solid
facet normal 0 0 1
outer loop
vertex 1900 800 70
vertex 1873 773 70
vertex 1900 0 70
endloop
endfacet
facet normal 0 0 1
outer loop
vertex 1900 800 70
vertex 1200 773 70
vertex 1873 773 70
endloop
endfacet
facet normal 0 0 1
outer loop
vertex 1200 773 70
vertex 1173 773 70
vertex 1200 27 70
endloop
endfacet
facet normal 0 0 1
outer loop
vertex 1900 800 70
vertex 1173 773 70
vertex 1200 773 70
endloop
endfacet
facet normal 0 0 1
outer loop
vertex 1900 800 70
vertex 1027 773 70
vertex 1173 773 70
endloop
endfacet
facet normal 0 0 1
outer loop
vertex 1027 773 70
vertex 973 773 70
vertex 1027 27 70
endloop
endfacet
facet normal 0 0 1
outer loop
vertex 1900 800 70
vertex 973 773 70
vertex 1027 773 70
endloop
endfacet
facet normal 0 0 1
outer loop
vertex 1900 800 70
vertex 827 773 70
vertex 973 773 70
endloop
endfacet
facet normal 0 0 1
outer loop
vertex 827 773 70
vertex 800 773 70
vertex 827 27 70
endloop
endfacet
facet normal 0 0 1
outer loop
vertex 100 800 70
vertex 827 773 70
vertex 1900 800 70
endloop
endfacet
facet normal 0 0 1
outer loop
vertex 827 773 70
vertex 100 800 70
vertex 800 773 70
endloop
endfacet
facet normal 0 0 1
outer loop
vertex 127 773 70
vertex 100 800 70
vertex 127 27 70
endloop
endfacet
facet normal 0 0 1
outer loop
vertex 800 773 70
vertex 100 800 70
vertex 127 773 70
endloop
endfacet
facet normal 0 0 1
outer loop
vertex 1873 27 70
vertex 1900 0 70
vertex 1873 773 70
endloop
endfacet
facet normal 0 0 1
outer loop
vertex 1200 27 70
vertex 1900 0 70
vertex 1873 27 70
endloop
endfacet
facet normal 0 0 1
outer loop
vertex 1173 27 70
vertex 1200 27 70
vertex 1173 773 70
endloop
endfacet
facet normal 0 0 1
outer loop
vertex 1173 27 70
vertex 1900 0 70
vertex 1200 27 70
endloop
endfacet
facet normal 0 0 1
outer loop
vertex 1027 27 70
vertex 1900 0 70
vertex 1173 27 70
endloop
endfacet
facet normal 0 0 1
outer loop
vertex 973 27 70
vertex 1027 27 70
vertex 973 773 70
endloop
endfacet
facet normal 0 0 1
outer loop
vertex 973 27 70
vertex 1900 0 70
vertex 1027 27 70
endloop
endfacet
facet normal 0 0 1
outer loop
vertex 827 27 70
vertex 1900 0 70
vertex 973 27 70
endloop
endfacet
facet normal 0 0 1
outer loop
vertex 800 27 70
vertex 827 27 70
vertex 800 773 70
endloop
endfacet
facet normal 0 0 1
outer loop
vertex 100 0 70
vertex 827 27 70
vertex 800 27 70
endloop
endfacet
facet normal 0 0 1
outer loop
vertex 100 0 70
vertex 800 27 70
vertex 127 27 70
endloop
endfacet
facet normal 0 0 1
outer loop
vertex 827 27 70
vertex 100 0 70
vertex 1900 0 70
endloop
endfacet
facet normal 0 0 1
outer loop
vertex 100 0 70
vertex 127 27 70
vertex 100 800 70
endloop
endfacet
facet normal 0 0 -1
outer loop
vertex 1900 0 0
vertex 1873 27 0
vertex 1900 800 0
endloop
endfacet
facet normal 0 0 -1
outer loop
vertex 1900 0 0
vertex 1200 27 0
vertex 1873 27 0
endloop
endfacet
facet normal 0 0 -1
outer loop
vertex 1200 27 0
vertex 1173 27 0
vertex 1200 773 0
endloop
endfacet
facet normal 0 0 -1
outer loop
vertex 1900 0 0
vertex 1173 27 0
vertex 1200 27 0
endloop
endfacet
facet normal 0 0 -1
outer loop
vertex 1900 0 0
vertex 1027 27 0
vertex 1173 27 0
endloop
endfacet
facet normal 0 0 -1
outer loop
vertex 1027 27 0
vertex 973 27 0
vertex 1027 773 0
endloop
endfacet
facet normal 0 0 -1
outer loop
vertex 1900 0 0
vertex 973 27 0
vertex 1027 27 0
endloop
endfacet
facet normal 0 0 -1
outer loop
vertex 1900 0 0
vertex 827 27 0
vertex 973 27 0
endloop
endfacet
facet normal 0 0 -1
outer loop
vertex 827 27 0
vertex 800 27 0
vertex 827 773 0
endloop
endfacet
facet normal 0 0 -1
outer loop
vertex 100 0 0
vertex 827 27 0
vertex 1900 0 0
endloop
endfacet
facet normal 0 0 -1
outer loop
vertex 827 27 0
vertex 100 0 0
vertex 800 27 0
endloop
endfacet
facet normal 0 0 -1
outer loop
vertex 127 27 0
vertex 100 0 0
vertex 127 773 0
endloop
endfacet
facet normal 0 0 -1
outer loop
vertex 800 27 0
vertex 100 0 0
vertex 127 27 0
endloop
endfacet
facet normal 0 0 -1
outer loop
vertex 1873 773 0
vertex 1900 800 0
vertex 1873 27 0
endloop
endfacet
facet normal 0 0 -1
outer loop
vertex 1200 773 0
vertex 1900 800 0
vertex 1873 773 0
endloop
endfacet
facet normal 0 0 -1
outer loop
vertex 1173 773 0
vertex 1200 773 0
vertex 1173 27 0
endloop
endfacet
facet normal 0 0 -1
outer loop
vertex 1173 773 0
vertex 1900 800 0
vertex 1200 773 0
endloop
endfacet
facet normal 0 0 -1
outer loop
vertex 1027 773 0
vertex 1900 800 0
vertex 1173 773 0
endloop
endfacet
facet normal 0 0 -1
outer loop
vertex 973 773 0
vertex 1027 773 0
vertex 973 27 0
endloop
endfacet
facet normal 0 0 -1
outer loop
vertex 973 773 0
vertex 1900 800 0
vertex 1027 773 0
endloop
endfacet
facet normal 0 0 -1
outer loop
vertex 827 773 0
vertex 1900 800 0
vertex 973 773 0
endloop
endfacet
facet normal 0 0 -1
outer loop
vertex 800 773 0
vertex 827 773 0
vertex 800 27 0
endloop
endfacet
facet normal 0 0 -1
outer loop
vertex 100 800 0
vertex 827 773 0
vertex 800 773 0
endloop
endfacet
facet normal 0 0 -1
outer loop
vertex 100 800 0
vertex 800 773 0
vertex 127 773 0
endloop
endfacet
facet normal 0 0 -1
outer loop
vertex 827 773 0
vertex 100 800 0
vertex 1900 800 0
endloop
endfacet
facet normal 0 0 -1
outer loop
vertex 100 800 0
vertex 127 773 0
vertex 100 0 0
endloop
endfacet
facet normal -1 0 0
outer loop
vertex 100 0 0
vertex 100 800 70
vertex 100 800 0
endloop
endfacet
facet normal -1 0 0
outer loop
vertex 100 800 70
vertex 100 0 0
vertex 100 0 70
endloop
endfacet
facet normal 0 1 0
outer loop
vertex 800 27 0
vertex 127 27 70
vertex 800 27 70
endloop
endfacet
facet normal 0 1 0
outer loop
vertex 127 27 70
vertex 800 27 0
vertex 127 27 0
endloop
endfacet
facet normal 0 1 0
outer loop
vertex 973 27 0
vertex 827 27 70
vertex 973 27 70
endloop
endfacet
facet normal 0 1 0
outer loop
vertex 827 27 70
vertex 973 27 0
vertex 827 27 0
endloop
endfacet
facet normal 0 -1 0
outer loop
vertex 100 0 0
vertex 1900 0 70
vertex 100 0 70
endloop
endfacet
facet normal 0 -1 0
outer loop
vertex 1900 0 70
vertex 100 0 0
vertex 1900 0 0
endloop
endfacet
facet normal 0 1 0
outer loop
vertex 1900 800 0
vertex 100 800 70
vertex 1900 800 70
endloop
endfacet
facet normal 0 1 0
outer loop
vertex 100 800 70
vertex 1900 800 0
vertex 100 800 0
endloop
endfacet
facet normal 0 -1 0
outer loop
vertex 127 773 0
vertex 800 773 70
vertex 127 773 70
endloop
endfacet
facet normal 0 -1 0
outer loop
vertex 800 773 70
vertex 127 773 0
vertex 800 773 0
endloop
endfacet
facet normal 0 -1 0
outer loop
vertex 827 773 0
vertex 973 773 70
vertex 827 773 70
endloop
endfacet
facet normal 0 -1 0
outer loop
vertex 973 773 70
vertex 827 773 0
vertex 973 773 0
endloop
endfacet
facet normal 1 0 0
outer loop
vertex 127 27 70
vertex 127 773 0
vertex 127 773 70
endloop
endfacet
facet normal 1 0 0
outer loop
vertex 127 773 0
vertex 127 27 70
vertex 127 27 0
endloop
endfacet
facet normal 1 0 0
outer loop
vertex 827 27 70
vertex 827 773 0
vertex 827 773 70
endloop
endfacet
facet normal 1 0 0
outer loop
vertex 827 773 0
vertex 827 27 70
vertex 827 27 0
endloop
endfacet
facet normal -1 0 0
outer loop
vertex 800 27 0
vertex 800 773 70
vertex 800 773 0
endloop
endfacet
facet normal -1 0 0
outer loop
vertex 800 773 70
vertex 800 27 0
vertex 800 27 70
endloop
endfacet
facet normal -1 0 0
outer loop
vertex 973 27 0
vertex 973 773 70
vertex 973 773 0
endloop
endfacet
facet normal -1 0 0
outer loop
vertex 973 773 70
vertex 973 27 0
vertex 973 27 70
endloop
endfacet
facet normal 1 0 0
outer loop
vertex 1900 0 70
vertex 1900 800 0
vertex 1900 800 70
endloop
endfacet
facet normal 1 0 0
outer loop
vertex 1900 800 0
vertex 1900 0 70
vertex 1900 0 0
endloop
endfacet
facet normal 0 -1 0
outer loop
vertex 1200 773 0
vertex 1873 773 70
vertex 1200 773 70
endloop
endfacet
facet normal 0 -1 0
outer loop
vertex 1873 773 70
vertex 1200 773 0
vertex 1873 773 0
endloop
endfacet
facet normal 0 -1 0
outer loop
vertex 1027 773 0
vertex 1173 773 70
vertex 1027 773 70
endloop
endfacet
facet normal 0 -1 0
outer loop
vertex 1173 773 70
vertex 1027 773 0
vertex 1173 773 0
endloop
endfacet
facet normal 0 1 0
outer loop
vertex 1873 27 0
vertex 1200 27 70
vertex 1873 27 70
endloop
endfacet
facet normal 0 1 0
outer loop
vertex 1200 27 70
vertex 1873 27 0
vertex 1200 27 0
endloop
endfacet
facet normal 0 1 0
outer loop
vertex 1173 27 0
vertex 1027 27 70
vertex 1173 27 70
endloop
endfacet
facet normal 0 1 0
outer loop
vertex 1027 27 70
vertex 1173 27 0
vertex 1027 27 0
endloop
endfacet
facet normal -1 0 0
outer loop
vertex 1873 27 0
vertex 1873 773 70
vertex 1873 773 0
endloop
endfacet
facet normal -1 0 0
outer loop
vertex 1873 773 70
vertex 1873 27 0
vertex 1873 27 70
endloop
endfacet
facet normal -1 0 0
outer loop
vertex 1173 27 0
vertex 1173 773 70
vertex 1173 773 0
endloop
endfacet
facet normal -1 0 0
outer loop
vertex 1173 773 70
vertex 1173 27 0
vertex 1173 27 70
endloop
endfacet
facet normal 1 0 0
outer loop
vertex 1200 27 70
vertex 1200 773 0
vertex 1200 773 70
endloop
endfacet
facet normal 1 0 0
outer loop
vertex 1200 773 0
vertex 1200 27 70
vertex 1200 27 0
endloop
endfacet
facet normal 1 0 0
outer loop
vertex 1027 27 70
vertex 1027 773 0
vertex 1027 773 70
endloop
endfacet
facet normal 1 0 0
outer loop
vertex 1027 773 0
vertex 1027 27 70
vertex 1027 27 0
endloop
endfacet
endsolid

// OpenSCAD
/*

    Nightstand
    
    By Anton Augustsson
    
    
*/

module roofFrame (
    plankWidth,plankThickness,
    totalWidth,totalLength,
    roofHangover,roofThickness,
    x,y,z,rotation){



// ---------- Calculated varables ----------

positionMiddleStud=700;
//totalLength/3*2-plankThickness+roofHangover+100

// ---------- Code ---------- 

translate([x,y,z])
rotate([0,0,rotation])  
union(){    
// ---------- Stud ---------- 
color("Wheat")
union(){
// Stud Front
translate([
    0,
    0,
    0]) 
cube(size = [
    (totalLength-roofHangover*2)/2,
    plankThickness,
    plankWidth]);

// Stud Back
translate([
    0,
    totalWidth-plankThickness
    -roofHangover*2,
    0]) 
cube(size = [
    (totalLength-roofHangover*2)/2,
    plankThickness,
    plankWidth]);

// Stud Left
translate([
    0,
    plankThickness,
    0]) 
cube(size = [
    plankThickness,
    totalWidth-plankThickness*2
    -roofHangover*2,
    plankWidth]);    

// Stud Middle
translate([
    positionMiddleStud,
    plankThickness,
    0]) 
cube(size = [
    plankThickness,
    totalWidth-plankThickness*2
    -roofHangover*2,
    plankWidth]);  

// Stud Right
translate([
    (totalLength-roofHangover*2)/2
    -plankThickness,
    plankThickness,
    0]) 
cube(size = [
    plankThickness,
    totalWidth-plankThickness*2
    -roofHangover*2,
    plankWidth]);
}
}}



/*
    ---------- Exampel ---------- 
*/


rotation = 10;
plankWidth     = 140;  // pine

plankThickness = 45;  // pine

totalWidth  = 1000;  // kayak width 
totalLength = 2000;  // kayak lenght

roofHangover = 100;  // etch side, only to studes
roofWidthIn  = 1000;  // calculated hypnotherapy, inner

studsAmount  = 2;  // kayak lenght, oposid diraction

roofHeight = 1;


roofFrame (
    70,27,
    totalWidth,totalLength,
    roofHangover,20,
    roofHangover,0,0,0);
roofFrame (
    70,27,
    totalWidth,totalLength,
    roofHangover,20,
    roofHangover
    +(totalLength-roofHangover*2),
    totalWidth-roofHangover*2,
    0,180);
